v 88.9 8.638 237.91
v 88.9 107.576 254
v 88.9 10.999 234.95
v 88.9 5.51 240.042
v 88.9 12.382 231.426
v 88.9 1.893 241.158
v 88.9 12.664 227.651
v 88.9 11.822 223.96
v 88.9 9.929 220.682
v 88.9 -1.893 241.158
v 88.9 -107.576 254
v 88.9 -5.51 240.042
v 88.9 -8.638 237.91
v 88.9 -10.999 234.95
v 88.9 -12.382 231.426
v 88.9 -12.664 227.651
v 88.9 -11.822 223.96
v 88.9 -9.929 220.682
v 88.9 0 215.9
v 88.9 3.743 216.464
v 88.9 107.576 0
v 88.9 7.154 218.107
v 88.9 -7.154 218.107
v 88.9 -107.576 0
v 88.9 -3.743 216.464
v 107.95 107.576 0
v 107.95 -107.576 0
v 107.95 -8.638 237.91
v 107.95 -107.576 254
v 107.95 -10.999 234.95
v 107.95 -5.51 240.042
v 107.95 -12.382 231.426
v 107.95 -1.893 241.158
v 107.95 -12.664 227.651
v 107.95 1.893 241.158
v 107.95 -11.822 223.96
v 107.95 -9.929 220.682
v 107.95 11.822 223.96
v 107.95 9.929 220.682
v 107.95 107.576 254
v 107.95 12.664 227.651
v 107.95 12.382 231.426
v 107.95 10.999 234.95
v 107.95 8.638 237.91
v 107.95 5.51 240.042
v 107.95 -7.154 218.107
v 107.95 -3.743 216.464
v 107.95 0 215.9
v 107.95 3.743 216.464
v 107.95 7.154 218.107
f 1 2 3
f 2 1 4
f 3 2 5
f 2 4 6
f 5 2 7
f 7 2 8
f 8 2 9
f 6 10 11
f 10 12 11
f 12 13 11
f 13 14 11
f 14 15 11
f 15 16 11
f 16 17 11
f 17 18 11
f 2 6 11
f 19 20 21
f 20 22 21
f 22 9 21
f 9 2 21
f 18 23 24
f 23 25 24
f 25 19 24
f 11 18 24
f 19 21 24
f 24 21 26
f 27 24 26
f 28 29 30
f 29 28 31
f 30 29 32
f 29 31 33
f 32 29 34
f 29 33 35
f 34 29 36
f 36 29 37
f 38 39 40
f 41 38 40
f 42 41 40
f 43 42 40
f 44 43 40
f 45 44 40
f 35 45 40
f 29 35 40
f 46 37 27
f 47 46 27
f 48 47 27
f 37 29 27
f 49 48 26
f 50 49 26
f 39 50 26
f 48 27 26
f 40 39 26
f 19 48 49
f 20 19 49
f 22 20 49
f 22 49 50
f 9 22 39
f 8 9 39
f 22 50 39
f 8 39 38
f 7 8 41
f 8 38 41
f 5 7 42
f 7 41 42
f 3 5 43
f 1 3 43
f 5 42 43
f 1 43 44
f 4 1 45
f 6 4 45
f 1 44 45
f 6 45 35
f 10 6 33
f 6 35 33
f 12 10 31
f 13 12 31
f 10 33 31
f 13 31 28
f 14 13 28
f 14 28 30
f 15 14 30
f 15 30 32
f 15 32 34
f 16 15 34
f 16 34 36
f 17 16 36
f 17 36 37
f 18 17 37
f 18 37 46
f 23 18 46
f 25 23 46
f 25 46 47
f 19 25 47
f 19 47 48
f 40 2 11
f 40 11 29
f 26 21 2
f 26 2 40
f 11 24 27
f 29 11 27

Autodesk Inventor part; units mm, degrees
ref_plane "YZ Plane" through (0, 0, 0) normal (1, 0, 0) x (0, 1, 0)
ref_plane "XZ Plane" through (0, 0, 0) normal (0, 1, 0) x (-1, 0, 0)
ref_plane "XY Plane" through (0, 0, 0) normal (0, 0, 1) x (1, 0, 0)
ref_plane "Work Plane1" through (0, 0, 0) normal (0, 0, 1) x (1, 0, 0)
sketch "Sketch1" plane through (0, 0, 0) normal (0, 0, 1) x (1, 0, 0)
  circle A0 centre (0, 0) radius 152.4 projected
  line L0 (107.95, -107.5758) -> (107.95, 107.5758)
  line L1 (88.9, 107.5758) -> (88.9, -107.5758)
  line L2 (88.9, -107.5758) -> (107.95, -107.5758)
  line L3 (88.9, 107.5758) -> (107.95, 107.5758)
  dimension "d0" = 19.05
  dimension "d1" = 88.9
extrude "Extrusion1" add sketch "Sketch1" along normal blind 254 contours L0 L2 L1 L3
sketch "Sketch2" plane through (107.95, -107.5758, 0) normal (1, 0, 0) x (0, 0, -1)
  line L0 (-254, 0) -> (-254, 215.1516) construction
  line L1 (-254, 107.5758) -> (0, 107.5758) construction
  circle A0 centre (-228.6, 107.5758) radius 12.7
  dimension "d4" = 25.4
  dimension "d5" = 25.4
extrude "Extrusion2" cut sketch "Sketch2" against normal through all
properties part number "sideSupportFor12inchBase"
